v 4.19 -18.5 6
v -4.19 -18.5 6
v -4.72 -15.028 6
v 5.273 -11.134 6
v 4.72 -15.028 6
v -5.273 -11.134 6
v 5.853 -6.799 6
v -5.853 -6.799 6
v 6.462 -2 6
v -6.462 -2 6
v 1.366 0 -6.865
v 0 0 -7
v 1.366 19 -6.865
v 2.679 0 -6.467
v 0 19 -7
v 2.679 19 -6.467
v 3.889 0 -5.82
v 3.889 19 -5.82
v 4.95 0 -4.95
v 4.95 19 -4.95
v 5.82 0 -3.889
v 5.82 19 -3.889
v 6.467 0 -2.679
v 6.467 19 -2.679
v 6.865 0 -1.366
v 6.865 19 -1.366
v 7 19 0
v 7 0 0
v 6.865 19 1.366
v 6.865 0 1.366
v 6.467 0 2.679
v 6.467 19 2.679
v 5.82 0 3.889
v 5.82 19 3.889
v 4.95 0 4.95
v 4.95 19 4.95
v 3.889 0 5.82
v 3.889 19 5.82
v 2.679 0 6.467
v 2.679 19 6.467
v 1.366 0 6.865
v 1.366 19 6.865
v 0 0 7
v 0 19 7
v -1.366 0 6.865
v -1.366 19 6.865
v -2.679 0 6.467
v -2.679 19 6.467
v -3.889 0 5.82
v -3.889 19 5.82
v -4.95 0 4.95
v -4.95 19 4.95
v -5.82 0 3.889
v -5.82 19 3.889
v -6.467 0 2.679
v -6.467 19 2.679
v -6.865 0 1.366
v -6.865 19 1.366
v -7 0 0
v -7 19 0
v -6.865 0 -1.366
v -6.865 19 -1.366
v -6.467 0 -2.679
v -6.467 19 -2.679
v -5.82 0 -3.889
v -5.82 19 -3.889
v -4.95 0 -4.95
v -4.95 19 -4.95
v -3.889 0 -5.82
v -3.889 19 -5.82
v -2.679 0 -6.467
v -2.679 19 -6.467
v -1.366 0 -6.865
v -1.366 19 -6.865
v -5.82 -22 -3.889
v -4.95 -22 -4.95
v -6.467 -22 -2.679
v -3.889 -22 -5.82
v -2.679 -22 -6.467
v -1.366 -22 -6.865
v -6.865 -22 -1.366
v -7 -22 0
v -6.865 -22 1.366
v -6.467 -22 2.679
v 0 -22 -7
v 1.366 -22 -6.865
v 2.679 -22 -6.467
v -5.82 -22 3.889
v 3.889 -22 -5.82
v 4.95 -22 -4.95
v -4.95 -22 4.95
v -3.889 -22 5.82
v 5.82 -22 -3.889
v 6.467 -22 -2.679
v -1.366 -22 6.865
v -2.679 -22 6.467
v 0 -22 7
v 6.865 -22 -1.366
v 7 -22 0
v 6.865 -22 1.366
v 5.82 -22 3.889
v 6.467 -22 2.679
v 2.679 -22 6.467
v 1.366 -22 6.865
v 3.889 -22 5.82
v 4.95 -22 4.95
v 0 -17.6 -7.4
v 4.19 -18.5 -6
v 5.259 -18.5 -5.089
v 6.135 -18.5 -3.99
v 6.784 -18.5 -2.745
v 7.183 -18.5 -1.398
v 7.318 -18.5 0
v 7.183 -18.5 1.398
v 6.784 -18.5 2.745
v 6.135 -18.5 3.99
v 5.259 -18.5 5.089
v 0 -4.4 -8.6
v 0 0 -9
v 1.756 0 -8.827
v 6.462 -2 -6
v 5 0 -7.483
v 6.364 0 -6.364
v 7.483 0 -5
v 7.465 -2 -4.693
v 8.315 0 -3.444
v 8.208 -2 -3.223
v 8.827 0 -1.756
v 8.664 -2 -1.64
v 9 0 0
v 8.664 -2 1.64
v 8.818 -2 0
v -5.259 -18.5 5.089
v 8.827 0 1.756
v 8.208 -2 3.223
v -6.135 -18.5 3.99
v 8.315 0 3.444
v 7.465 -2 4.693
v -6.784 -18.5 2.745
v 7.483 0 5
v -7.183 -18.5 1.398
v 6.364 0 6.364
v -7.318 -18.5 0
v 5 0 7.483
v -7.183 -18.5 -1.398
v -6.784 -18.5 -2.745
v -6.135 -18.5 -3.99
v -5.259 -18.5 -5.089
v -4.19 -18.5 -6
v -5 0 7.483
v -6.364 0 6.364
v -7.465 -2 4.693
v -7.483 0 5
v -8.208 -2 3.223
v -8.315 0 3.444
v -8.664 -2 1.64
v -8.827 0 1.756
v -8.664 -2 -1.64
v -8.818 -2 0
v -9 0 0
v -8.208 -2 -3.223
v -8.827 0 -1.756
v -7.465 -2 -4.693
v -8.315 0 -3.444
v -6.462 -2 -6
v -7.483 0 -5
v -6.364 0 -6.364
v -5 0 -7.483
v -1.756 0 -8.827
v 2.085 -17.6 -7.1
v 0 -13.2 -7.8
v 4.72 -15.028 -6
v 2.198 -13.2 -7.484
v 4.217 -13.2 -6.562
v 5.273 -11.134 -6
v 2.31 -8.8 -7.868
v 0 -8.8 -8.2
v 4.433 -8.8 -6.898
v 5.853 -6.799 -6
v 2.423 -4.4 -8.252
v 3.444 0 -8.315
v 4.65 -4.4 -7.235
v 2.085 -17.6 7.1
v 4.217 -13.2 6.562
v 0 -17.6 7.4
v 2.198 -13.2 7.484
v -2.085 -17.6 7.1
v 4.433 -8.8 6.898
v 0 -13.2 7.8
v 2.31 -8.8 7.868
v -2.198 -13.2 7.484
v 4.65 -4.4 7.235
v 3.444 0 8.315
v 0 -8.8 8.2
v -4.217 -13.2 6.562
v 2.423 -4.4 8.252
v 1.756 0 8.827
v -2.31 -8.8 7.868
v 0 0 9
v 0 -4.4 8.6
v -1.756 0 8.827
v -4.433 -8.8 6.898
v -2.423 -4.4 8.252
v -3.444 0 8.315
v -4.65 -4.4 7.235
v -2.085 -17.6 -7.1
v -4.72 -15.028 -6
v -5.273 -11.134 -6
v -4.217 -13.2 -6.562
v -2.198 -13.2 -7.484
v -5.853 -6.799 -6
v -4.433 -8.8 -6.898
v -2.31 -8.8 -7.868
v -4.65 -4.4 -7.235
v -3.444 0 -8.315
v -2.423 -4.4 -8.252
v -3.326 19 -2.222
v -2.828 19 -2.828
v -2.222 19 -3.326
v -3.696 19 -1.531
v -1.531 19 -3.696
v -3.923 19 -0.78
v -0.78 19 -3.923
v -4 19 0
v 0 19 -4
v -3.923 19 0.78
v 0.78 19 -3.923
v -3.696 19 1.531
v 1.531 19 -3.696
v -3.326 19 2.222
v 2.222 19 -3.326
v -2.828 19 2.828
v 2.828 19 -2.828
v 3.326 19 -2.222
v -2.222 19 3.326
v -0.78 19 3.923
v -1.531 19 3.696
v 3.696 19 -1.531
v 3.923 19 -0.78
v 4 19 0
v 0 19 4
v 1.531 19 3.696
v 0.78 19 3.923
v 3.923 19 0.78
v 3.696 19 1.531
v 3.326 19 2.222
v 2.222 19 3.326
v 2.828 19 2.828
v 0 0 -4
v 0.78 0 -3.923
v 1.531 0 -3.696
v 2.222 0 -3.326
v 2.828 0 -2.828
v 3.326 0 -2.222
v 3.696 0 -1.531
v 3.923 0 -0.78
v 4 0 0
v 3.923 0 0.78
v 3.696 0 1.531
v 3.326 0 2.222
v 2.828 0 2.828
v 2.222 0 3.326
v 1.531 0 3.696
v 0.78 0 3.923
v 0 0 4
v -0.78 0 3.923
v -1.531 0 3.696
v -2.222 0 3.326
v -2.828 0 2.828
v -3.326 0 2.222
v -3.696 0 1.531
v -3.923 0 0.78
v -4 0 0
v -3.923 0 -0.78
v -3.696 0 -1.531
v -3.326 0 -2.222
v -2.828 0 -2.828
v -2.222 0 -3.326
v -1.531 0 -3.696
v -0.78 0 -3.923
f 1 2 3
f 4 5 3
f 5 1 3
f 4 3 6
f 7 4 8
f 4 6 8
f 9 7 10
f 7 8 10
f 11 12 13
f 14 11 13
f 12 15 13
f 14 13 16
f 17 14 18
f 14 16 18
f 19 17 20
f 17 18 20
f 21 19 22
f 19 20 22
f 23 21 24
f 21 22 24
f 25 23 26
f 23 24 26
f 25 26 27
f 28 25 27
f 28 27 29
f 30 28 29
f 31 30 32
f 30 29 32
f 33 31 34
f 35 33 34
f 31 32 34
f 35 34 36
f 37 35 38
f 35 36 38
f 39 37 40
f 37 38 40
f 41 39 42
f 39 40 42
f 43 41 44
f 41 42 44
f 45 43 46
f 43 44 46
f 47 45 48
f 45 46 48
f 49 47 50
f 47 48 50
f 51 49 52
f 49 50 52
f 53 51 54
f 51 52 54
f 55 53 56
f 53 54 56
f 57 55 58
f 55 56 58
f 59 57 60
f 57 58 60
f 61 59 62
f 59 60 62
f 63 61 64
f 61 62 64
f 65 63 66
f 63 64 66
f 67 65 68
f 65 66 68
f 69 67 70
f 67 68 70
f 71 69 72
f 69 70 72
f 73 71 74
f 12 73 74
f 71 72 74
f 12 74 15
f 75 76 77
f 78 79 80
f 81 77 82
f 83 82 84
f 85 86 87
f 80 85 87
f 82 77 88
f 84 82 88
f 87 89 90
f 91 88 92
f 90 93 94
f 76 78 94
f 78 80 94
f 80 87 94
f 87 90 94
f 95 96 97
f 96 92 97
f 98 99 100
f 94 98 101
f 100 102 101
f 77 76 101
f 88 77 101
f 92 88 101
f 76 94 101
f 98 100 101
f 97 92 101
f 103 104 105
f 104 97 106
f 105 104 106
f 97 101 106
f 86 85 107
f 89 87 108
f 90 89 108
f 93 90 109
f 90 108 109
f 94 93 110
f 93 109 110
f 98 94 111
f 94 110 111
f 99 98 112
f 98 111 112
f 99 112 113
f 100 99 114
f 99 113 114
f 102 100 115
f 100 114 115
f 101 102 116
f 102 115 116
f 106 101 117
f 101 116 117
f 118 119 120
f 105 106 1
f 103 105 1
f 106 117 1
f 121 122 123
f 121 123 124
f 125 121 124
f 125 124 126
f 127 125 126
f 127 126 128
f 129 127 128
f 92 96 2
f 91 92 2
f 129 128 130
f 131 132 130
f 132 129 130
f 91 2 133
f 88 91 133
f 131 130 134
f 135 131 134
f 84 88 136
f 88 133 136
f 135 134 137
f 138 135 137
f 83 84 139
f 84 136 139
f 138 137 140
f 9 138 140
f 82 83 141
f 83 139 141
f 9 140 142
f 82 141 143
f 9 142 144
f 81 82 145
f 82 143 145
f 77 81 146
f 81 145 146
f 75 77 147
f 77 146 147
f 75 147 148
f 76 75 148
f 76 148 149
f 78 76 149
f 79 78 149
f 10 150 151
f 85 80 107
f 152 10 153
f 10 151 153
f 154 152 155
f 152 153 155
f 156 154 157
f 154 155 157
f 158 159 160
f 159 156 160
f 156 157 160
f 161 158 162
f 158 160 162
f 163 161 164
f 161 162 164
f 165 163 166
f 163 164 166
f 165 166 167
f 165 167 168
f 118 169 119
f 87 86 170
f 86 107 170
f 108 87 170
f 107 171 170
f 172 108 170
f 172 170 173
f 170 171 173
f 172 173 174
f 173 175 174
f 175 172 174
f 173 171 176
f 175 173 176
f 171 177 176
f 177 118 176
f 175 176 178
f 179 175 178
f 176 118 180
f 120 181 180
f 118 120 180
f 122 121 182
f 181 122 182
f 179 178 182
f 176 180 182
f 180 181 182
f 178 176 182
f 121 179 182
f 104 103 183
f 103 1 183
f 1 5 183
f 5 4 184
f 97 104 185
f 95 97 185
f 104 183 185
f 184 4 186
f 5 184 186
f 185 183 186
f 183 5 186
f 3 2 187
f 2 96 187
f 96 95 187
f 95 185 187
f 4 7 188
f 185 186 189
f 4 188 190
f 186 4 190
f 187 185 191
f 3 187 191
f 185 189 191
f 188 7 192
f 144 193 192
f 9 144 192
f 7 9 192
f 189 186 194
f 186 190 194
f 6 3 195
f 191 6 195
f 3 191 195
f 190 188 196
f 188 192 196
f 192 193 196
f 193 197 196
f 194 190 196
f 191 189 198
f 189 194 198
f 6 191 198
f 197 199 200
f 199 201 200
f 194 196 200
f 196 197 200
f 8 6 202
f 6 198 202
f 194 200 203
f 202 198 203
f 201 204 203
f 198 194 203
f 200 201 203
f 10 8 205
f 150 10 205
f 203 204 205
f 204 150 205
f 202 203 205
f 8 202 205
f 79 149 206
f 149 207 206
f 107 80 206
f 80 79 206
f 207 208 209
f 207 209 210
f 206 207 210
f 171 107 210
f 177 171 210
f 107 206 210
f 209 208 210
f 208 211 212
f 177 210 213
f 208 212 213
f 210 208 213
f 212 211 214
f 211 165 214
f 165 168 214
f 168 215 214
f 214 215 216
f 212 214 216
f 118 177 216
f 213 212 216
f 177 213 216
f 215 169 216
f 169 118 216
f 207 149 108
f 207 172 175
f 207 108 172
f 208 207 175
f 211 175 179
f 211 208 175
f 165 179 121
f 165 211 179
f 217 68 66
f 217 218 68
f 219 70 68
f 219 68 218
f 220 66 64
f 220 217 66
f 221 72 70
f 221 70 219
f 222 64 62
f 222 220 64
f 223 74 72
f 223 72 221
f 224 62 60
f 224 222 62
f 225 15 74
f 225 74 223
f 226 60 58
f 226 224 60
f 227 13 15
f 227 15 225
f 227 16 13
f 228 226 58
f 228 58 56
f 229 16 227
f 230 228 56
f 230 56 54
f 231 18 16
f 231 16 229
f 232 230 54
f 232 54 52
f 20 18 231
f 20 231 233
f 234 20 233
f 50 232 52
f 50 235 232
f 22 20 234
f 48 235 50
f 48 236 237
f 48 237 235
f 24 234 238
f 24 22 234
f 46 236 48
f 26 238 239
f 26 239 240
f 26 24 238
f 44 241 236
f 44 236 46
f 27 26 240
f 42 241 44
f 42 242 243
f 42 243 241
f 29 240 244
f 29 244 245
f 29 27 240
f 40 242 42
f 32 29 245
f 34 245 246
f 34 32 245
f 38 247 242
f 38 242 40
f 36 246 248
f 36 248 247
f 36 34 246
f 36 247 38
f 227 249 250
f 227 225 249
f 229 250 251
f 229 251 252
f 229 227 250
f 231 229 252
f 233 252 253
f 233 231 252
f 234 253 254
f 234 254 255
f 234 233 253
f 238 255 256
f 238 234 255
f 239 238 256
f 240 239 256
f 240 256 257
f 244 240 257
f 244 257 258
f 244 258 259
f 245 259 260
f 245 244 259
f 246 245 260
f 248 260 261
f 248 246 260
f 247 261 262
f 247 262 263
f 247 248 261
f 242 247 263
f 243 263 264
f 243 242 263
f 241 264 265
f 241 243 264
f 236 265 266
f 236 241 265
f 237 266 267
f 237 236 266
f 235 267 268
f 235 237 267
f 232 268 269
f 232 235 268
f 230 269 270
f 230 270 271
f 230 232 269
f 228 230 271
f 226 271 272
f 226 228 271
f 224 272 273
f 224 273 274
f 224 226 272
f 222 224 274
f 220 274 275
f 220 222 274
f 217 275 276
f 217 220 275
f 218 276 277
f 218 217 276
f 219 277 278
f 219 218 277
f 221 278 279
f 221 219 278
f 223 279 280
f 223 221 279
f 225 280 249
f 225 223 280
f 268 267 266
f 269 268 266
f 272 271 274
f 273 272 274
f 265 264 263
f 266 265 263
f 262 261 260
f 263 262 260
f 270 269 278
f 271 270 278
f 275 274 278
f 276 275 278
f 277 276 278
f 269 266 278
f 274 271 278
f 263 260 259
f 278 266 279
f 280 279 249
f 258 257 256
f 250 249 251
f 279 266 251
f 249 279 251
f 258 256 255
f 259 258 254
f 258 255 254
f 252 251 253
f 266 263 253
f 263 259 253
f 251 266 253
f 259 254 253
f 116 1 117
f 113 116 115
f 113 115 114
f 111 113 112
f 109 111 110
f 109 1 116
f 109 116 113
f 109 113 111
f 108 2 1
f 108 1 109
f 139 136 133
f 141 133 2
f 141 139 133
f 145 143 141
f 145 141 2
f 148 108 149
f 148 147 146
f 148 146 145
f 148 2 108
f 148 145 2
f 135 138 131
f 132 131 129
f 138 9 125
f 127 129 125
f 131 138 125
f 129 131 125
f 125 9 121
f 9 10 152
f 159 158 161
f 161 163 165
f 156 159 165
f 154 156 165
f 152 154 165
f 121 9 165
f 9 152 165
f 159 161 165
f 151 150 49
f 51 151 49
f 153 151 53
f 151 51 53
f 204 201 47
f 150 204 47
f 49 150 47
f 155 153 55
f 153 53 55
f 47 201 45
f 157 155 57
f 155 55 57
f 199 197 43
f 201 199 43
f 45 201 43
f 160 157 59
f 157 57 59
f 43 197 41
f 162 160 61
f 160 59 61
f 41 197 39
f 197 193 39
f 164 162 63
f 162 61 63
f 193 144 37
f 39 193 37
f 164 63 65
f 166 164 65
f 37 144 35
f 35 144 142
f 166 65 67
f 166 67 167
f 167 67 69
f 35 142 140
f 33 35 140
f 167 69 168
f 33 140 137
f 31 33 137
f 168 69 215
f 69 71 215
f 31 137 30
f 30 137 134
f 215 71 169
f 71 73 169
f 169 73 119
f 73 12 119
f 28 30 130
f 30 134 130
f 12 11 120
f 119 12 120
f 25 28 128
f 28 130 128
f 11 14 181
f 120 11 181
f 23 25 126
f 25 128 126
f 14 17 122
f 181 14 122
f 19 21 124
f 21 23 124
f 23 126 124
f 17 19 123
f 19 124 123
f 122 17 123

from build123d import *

# Parameters (mm, degrees)
SKETCH1_W               = 3
SKETCH1_H               = 19
SKETCH2_W               = 12
SKETCH2_H               = 16.5
CUT_EXTRUDE1_DEPTH      = 10
CUT_EXTRUDE1_DEPTH_BACK = 10


with BuildPart() as part:
    # Sketch1 → Revolve1 (revolve)
    with BuildSketch(Plane(origin=(0, 0, 0), x_dir=(0, 0, -1), z_dir=(1, 0, 0))):
        with Locations((5.5, 9.5)):
            Rectangle(SKETCH1_W, SKETCH1_H)
        Polygon((7, 0), (4, 0), (0, 0), (0, -22), (7, -22), (9, 0), align=None)
    revolve(axis=Axis((0, 13.924528302, 0), (0, -1, 0)))

    # Sketch2 → Cut-Extrude1 (cut, two sides)
    with BuildSketch(Plane(origin=(0, 0, 0), x_dir=(0, 0, -1), z_dir=(1, 0, 0))) as cut_extrude1_sk:
        with Locations((0, -10.25)):
            Rectangle(SKETCH2_W, SKETCH2_H)
    extrude(amount=CUT_EXTRUDE1_DEPTH, mode=Mode.SUBTRACT)
    extrude(cut_extrude1_sk.sketch, amount=-CUT_EXTRUDE1_DEPTH_BACK, mode=Mode.SUBTRACT)


solid = part.part
